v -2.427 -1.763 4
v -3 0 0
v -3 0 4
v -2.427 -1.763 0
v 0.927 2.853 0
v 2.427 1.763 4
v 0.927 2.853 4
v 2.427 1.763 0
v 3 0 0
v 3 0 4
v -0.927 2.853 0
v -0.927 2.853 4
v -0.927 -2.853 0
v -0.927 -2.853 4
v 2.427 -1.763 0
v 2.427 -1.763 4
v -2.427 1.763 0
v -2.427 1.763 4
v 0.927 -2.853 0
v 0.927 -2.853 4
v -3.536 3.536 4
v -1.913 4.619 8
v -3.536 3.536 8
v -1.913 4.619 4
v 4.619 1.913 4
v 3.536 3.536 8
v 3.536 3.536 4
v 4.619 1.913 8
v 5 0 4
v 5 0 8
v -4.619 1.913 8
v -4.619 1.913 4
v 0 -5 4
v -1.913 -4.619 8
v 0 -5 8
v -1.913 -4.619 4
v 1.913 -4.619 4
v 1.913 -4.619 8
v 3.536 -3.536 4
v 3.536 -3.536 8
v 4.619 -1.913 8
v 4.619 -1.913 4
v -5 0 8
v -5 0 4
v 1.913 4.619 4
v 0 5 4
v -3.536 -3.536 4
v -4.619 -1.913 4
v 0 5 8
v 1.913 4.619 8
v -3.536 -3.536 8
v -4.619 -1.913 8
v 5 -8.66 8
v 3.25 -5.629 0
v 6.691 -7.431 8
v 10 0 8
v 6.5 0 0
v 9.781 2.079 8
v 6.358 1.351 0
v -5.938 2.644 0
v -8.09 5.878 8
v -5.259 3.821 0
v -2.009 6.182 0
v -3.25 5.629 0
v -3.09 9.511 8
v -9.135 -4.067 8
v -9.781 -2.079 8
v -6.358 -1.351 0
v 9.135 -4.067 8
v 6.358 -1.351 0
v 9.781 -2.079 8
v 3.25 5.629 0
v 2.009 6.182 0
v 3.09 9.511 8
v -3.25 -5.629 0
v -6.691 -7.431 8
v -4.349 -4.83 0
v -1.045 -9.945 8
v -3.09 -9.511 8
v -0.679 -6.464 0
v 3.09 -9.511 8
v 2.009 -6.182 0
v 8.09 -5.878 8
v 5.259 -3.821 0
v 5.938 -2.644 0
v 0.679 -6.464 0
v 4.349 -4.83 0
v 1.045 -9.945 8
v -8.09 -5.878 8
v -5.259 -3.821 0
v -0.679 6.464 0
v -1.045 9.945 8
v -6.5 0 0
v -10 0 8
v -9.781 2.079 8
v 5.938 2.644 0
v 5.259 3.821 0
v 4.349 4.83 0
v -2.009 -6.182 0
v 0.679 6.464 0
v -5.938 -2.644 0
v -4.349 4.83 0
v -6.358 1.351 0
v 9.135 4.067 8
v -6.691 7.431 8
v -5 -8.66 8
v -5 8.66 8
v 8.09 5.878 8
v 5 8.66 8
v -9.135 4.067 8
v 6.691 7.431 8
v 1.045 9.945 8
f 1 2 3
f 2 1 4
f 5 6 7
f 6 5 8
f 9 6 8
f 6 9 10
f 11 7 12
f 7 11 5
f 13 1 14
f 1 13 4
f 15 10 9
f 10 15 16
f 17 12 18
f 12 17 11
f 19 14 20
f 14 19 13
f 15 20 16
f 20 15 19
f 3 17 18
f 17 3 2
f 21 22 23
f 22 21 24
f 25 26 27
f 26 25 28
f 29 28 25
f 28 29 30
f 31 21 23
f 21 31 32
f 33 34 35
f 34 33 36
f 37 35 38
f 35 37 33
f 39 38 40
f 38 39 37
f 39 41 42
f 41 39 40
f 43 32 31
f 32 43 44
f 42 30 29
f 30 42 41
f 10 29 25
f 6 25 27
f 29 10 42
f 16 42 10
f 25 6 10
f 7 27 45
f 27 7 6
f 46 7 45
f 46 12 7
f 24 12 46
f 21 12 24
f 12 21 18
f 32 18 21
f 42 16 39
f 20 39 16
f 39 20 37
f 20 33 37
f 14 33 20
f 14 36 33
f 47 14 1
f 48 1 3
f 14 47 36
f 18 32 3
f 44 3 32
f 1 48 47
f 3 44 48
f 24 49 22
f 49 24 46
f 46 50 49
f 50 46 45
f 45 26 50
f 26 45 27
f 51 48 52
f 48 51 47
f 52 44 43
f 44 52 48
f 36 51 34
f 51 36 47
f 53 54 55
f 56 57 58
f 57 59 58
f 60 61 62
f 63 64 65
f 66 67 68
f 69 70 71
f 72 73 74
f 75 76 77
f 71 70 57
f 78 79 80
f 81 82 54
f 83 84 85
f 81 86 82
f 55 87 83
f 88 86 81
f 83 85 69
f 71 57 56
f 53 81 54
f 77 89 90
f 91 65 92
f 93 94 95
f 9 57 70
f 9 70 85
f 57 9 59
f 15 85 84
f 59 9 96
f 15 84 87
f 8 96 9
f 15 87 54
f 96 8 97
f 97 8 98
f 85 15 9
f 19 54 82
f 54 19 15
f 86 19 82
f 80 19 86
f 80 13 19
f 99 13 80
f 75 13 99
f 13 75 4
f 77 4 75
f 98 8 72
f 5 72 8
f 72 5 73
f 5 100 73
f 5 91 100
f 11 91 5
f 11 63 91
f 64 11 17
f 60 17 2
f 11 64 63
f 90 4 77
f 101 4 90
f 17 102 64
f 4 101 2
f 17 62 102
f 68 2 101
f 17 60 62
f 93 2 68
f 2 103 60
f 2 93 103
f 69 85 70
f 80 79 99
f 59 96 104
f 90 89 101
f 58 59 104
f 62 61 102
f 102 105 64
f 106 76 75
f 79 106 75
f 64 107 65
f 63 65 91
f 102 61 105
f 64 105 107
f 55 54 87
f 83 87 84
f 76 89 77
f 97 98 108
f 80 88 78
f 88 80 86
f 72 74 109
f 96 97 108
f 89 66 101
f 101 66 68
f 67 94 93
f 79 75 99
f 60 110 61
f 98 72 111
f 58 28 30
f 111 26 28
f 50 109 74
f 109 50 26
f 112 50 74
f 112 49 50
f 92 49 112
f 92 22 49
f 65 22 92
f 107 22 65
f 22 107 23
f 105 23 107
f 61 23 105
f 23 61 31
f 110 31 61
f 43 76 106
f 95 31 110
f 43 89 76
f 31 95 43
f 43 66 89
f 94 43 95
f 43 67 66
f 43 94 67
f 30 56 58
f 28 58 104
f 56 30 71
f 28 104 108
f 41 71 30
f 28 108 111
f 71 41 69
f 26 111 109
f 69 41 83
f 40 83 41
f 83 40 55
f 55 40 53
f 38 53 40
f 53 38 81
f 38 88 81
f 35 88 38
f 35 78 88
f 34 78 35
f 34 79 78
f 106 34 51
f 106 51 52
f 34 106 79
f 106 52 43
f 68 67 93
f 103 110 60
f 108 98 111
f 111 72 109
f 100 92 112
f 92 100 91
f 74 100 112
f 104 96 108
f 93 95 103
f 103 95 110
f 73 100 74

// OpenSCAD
// Dimensions are mm
// 
// Huge shout out to http://openscad.org/cheatsheet/

screw_major_diameter = 4;
screw_minor_diameter = 2.5;
screw_hole = (screw_major_diameter + screw_minor_diameter) / 2;

screw_head_radius = 8 / 2; // 8 is diameter rounded up
screw_head_height = 3;

// This is how thick the plastic will be under the screw head.
// Too thin and it'll break, but we don't want huge feet too.
bearing_thickness = 4;

crate_radius = 6.5;
floor_radius = 10;

// Create some wiggle room around a measurement since the printer isn't that 
// precise. This just rounds up to the nearest mm, and adds 1mm.
function loose_fit(n, slop=1) = ceil(n + slop);

total_height = bearing_thickness + loose_fit(screw_head_height);

difference() {
    // body
    cylinder(
        r1=crate_radius, 
        r2=floor_radius, 
        h=total_height);

    // screw hole
    union() {
        // Screw thread hole. The translation and extra height are to make sure 
        // it completely punches through the body
        translate ([0,0,-1]) cylinder(
            r=loose_fit(screw_minor_diameter / 2),
            h=total_height + 2
        );

        // extra space for screw head
        translate ([0,0,total_height - loose_fit(screw_head_height)]) cylinder(
            r=loose_fit(screw_head_radius), 
            h=loose_fit(screw_head_height) + 1 // again to cleanly punch through the body
        );
    };
};
